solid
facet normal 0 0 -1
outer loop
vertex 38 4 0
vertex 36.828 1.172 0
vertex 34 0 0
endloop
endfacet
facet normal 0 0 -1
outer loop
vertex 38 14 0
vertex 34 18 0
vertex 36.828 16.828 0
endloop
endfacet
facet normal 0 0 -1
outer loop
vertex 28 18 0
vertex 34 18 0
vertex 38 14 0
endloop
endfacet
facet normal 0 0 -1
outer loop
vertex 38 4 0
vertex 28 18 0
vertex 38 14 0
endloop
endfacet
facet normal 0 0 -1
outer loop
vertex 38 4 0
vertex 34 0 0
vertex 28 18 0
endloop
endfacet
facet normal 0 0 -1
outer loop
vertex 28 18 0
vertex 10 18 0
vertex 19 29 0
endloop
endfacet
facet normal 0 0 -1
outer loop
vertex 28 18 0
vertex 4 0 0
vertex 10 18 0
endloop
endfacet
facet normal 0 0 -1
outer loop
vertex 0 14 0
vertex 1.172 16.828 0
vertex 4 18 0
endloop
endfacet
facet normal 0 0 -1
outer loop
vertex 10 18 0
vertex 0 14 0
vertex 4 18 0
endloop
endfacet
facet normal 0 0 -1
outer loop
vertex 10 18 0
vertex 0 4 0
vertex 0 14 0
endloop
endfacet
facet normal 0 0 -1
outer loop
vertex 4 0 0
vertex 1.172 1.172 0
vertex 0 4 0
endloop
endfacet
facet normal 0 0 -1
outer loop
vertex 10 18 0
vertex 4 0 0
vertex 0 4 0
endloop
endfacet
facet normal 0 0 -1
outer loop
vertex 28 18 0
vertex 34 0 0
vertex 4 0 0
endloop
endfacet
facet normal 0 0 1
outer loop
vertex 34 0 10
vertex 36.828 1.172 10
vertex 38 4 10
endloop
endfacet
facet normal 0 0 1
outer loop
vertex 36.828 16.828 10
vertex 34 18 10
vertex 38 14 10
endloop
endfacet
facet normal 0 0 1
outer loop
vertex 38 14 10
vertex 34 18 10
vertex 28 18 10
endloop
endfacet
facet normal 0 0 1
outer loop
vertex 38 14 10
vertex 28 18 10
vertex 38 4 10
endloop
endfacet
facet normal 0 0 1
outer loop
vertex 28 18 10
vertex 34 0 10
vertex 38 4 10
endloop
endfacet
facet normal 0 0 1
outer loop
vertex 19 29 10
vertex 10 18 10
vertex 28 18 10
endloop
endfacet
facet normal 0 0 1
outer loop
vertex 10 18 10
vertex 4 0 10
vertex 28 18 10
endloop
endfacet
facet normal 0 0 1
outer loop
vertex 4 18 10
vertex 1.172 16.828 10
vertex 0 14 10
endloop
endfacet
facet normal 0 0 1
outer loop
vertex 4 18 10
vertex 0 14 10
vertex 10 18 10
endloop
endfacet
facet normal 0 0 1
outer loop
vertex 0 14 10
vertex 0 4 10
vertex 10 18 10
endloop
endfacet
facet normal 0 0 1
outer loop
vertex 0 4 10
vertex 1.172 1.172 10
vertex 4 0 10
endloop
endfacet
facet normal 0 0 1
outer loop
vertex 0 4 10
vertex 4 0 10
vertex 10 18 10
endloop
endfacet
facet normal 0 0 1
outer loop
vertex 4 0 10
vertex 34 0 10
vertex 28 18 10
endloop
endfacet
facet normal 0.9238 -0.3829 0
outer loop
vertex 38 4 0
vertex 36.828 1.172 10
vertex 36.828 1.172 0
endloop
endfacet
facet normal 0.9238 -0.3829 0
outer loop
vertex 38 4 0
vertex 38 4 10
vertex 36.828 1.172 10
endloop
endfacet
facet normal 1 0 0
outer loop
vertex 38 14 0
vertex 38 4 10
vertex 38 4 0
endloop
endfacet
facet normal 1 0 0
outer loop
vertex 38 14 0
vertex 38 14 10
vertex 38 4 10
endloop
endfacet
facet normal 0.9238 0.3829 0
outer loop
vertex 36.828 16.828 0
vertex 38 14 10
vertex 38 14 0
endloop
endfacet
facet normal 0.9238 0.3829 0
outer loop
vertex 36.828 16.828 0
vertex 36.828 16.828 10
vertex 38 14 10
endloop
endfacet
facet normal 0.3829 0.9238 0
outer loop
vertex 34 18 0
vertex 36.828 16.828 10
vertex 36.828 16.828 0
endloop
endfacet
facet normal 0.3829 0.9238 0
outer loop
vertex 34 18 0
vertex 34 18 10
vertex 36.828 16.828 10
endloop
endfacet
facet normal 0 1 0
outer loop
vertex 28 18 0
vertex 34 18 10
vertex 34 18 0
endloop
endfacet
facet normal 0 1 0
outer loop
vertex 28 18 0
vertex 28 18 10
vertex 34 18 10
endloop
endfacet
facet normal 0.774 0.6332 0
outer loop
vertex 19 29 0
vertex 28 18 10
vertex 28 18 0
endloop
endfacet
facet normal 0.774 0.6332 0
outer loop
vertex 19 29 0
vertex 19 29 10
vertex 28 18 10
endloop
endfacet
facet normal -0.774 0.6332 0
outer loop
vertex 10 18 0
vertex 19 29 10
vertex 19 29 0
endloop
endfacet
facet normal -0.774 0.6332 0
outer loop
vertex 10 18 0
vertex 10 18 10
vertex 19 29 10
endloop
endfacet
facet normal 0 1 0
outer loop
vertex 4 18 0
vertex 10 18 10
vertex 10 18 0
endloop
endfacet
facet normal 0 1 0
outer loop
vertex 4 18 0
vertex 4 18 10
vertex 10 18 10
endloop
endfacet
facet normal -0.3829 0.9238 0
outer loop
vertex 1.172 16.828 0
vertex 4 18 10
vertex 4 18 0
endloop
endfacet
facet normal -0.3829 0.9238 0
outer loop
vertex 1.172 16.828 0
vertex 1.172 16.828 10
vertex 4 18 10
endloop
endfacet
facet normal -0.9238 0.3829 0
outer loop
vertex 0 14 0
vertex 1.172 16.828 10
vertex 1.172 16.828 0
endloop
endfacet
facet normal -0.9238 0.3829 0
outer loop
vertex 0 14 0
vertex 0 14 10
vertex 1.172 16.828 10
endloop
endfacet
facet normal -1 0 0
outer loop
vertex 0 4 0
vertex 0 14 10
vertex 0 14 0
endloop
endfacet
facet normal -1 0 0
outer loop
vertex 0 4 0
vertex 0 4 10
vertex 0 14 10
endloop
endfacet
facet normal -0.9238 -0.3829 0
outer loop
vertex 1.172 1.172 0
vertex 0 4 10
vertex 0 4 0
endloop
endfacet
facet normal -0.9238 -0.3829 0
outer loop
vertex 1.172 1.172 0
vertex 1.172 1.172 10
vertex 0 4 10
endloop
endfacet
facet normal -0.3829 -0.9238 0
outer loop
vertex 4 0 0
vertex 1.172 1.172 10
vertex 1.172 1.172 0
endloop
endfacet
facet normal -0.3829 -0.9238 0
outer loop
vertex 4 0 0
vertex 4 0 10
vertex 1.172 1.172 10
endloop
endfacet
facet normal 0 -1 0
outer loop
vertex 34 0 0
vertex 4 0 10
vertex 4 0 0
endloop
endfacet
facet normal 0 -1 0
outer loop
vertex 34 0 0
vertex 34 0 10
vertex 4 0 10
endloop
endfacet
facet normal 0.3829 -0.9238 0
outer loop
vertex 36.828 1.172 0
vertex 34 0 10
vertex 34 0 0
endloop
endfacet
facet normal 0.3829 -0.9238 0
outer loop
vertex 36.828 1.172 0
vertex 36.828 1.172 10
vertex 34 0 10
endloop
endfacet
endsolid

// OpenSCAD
$fn = 32;

// ----------------------------------------------------------------------
// Ratchet pawl: 38 x 18 mm body, beak 11 mm сверху
// ----------------------------------------------------------------------

// --- parameters (mm) ---
profile_height = 10;      // extrusion height
profile_points = 15;      // points of the closed outline

profile = [[0, 4], [1.172, 1.172], [4, 0], [34, 0], [36.828, 1.172], [38, 4], [38, 14], [36.828, 16.828], [34, 18], [28, 18], [19, 29], [10, 18], [4, 18], [1.172, 16.828], [0, 14]];  // single closed polygon, 15 points, counter clockwise

// --- the one profile operation ---
linear_extrude(height = profile_height) polygon(points = profile);
